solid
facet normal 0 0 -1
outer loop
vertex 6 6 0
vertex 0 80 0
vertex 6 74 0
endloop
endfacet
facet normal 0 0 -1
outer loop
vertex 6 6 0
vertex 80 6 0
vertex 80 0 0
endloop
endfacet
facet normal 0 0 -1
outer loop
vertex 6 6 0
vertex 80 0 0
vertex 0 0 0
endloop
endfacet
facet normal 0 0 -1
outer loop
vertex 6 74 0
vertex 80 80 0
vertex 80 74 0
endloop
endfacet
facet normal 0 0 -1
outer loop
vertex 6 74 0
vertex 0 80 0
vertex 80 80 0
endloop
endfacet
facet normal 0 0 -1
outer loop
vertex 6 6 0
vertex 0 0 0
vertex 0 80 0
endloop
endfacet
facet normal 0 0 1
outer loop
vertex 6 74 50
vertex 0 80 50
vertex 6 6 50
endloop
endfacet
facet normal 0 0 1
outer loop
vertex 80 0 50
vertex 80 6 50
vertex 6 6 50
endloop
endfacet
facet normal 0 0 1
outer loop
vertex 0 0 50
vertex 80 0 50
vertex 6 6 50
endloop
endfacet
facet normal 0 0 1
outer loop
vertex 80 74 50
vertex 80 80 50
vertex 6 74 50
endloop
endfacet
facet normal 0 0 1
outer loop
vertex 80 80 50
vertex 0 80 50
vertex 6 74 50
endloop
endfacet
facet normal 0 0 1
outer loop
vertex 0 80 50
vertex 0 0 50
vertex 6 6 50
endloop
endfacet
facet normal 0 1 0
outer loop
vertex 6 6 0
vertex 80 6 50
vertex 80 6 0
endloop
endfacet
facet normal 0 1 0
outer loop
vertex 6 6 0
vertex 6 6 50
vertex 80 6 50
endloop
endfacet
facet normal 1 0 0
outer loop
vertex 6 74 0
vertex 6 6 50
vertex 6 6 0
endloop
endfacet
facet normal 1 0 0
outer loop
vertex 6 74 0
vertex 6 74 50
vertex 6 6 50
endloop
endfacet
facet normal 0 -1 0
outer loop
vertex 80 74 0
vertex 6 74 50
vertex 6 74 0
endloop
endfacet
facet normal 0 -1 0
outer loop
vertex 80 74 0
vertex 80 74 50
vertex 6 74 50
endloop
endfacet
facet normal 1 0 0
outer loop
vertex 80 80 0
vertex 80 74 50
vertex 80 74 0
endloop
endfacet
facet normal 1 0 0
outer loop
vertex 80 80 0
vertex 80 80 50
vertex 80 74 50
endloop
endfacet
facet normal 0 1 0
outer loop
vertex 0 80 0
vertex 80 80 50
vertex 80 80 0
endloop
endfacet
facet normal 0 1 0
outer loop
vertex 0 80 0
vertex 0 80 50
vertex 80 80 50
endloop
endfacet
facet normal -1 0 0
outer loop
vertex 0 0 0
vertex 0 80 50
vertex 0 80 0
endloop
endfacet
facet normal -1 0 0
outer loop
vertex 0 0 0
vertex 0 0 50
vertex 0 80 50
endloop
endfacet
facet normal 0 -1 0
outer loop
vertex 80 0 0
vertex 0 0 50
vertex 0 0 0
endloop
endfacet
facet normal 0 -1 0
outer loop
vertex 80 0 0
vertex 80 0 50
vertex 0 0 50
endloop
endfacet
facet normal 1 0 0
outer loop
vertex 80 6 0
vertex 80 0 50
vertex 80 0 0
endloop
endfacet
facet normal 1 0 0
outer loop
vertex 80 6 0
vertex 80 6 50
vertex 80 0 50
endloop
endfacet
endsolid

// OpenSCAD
$fn = 32;

// ----------------------------------------------------------------------
// Structural section: channel 80 x 80 mm
// ----------------------------------------------------------------------

// --- parameters (mm) ---
sec_w = 80;               // channel width, X
sec_h = 80;               // channel height, Y
flange_t = 6;             // flange thickness
web_t = 6;                // web thickness
plate_t = 50;             // cut length, Z (extrusion height)

profile = [[0, 0], [80, 0], [80, 6], [6, 6], [6, 74], [80, 74], [80, 80], [0, 80]];  // primary outline, 8 points, counter clockwise

// --- the one profile operation ---
linear_extrude(height = plate_t) polygon(points = profile);
